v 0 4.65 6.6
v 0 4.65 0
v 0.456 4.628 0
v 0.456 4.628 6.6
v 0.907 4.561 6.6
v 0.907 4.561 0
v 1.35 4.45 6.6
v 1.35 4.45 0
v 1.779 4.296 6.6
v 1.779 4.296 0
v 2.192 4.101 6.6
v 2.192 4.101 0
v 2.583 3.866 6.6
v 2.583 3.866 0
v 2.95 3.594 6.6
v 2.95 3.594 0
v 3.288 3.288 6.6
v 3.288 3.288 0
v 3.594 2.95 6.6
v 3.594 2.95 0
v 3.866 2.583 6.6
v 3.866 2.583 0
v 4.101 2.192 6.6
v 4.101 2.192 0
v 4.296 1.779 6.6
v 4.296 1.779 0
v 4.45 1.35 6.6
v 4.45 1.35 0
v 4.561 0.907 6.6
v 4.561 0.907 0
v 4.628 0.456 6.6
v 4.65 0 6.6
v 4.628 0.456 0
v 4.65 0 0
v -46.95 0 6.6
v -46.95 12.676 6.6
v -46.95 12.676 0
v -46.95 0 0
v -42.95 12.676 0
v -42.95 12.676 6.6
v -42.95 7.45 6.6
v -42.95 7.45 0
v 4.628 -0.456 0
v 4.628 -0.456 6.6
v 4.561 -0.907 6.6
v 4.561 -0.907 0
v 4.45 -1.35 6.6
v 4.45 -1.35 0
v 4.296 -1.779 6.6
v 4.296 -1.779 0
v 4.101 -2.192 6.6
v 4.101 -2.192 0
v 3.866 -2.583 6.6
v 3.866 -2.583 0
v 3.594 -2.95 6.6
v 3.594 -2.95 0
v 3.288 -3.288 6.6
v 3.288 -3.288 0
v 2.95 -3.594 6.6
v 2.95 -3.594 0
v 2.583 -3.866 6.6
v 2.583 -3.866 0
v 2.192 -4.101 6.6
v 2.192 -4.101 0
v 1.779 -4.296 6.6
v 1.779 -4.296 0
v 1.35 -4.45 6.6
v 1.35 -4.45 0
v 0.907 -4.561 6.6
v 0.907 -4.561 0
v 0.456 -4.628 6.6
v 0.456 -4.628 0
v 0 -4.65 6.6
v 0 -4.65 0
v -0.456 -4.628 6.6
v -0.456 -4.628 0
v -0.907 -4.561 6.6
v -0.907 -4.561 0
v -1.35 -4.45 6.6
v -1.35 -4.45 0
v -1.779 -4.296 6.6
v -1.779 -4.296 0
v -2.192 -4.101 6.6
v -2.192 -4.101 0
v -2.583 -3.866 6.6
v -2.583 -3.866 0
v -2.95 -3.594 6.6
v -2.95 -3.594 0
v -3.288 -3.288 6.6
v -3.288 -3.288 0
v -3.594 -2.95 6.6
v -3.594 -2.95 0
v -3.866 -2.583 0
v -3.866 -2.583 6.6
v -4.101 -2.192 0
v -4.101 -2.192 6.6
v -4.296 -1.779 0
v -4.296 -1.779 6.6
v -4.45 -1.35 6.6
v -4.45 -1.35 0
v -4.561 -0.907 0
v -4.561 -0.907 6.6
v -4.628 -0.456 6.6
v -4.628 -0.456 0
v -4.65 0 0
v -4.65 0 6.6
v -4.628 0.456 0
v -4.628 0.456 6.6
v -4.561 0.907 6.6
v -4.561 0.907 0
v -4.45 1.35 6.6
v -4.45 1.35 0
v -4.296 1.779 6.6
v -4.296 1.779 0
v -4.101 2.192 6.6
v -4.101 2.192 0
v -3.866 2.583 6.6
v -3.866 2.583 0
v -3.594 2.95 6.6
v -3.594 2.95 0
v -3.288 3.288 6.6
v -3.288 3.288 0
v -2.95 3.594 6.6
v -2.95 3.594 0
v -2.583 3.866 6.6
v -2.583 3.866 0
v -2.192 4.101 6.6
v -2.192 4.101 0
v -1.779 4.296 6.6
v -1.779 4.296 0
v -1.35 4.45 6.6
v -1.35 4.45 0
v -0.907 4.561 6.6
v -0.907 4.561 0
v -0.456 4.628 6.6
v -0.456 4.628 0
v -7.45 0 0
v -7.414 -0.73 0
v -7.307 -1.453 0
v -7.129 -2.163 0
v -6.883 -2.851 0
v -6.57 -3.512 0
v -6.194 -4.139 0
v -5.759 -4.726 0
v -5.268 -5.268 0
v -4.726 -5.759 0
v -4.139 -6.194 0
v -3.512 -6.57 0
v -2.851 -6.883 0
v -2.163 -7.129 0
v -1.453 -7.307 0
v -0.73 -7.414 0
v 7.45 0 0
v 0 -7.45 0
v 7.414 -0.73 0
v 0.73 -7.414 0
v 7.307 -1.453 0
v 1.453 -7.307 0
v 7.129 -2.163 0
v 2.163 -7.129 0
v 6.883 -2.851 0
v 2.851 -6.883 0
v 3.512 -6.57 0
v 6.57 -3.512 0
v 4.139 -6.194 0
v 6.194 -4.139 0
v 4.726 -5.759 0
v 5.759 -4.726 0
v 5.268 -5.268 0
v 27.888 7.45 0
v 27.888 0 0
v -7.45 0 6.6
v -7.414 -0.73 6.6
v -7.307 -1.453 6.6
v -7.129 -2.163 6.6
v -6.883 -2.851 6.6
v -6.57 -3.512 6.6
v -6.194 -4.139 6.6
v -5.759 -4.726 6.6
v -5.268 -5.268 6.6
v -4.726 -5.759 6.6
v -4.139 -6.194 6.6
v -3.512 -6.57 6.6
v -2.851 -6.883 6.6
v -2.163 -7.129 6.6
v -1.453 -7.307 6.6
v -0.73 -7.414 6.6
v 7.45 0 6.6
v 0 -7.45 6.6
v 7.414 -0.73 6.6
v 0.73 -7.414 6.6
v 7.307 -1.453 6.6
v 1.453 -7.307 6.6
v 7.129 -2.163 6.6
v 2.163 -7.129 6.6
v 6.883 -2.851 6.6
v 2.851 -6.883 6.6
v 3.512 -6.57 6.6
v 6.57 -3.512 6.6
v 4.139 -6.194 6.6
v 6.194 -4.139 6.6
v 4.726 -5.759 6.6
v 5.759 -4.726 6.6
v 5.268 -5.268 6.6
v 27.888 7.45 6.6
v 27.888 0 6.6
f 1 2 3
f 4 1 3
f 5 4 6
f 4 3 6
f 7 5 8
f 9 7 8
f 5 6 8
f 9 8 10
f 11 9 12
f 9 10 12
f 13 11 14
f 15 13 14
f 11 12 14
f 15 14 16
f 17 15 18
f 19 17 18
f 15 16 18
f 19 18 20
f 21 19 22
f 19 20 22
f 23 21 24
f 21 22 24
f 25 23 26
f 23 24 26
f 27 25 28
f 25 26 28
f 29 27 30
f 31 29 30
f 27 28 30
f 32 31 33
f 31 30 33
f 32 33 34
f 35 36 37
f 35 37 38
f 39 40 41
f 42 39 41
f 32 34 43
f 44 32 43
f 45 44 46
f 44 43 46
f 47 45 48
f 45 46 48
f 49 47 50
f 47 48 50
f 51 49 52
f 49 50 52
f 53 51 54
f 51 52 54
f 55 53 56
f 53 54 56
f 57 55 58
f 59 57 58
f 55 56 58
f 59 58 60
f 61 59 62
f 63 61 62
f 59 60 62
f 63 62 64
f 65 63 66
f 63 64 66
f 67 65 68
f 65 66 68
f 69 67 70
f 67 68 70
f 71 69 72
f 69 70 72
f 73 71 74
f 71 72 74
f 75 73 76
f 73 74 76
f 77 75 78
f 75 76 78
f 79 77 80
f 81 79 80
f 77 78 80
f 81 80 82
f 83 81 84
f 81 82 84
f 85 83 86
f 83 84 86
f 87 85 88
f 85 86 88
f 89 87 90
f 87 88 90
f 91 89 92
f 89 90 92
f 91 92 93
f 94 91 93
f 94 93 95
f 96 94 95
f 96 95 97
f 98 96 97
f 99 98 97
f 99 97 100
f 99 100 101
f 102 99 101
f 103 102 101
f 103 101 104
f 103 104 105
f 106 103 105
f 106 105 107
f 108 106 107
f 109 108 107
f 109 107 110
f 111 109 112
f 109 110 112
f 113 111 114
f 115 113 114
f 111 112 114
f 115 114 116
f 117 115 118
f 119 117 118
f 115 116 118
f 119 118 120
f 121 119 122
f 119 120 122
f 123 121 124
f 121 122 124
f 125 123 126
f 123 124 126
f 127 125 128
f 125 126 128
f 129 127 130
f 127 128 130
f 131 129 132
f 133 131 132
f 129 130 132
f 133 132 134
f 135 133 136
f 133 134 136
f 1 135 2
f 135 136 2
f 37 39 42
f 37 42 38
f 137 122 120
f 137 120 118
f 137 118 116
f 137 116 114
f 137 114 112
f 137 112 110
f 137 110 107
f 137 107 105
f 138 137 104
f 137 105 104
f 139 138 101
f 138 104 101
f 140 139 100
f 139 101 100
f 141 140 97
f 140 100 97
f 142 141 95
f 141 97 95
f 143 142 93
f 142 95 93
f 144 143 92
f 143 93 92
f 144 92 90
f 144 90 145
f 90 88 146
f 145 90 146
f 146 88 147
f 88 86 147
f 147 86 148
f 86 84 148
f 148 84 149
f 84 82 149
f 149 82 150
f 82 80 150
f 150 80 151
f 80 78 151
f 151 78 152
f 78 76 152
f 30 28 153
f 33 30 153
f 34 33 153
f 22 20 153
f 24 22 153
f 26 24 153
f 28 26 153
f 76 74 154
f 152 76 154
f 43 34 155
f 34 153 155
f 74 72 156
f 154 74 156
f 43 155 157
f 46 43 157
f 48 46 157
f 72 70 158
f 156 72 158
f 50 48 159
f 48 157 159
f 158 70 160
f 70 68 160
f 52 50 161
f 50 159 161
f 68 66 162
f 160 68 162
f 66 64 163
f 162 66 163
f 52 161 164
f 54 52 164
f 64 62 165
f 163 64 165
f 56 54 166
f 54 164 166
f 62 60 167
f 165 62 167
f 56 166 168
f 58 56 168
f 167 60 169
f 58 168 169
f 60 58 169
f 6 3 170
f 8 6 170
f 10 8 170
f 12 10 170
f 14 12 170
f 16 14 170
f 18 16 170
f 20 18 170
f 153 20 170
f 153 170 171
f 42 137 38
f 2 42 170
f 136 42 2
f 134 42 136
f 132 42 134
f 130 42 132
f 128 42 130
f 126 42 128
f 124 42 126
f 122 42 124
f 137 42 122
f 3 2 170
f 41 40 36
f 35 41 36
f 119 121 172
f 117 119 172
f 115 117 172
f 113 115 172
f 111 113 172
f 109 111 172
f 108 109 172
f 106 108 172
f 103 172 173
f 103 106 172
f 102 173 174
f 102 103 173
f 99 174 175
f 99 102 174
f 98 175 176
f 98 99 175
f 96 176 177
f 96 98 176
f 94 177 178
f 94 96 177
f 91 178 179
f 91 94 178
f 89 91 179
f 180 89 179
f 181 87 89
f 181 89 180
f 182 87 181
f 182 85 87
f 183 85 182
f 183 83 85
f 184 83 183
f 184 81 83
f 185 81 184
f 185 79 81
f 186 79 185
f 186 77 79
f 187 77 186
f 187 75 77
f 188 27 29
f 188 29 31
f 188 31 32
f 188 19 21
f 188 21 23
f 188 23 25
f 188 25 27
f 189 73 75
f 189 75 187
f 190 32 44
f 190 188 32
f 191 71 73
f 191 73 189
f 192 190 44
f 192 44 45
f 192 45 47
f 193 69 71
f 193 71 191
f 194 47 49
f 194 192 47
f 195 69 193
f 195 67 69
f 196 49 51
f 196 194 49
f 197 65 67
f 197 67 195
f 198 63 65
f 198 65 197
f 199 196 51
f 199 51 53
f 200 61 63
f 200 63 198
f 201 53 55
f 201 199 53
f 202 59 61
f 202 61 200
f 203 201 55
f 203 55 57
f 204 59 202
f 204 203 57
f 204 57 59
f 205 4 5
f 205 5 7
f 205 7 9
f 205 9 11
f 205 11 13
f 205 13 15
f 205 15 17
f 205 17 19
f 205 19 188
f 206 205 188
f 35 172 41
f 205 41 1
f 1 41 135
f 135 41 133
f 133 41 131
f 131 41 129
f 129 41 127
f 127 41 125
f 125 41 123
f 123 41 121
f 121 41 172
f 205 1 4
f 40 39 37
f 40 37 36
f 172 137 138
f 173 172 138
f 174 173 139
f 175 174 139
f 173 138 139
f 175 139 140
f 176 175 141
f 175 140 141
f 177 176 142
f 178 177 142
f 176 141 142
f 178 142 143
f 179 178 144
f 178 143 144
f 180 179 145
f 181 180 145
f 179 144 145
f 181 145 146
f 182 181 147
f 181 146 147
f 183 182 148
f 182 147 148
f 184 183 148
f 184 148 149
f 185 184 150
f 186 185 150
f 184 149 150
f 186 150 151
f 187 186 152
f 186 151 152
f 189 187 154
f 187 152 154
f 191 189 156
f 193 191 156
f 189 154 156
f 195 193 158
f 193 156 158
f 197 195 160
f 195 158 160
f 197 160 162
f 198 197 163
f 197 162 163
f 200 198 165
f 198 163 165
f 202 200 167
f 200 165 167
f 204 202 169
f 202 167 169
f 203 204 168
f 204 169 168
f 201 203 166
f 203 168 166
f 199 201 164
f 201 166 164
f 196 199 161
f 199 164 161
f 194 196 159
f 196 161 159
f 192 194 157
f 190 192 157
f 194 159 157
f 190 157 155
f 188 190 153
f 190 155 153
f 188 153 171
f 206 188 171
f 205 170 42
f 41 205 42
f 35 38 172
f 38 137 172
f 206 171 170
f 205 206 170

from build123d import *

# Parameters (mm, degrees)
F1_DEPTH = 6.6
F2_W     = 12.675607577
F2_H     = 6.6
F3_DEPTH = 4


with BuildPart() as f1:
    # F0 (on Top) → F1 (new body)
    with BuildSketch(Plane.XY):
        with BuildLine():
            Line((7.45, 0), (4.65, 0))
            ThreePointArc((4.65, 0), (-3.2880465325, -3.2880465325), (0, 4.65))
            Line((0, 4.65), (0, 7.45))
            ThreePointArc((0, 7.45), (-5.2679455198, 5.2679455198), (-7.45, 0))
            ThreePointArc((-7.45, 0), (0, -7.45), (7.45, 0))
        make_face()
        with BuildLine():
            ThreePointArc((0, 4.65), (3.2880465325, 3.2880465325), (4.65, 0))
            Line((4.65, 0), (7.45, 0))
            ThreePointArc((7.45, 0), (5.2679455198, 5.2679455198), (0, 7.45))
            Line((0, 7.45), (0, 4.65))
        make_face()
        with BuildLine():
            ThreePointArc((0, 7.45), (5.2679455198, 5.2679455198), (7.45, 0))
            Line((7.45, 0), (27.8879404068, 0))
            Line((27.8879404068, 0), (27.8879404068, 7.45))
            Line((27.8879404068, 7.45), (0, 7.45))
        make_face()
        with BuildLine():
            ThreePointArc((-7.45, 0), (-5.2679455198, 5.2679455198), (0, 7.45))
            Line((0, 7.45), (-42.95, 7.45))
            Line((-42.95, 7.45), (-42.95, 0))
            Line((-42.95, 0), (-7.45, 0))
        make_face()
    extrude(amount=F1_DEPTH)

    # F2 (on face) → F3 (join)
    with BuildSketch(Plane(origin=(-42.95, 0, 0), x_dir=(0, -1, 0), z_dir=(-1, 0, 0))):
        with Locations((-6.3378037885, 3.3)):
            Rectangle(F2_W, F2_H)
    extrude(amount=F3_DEPTH)


solid = f1.part
